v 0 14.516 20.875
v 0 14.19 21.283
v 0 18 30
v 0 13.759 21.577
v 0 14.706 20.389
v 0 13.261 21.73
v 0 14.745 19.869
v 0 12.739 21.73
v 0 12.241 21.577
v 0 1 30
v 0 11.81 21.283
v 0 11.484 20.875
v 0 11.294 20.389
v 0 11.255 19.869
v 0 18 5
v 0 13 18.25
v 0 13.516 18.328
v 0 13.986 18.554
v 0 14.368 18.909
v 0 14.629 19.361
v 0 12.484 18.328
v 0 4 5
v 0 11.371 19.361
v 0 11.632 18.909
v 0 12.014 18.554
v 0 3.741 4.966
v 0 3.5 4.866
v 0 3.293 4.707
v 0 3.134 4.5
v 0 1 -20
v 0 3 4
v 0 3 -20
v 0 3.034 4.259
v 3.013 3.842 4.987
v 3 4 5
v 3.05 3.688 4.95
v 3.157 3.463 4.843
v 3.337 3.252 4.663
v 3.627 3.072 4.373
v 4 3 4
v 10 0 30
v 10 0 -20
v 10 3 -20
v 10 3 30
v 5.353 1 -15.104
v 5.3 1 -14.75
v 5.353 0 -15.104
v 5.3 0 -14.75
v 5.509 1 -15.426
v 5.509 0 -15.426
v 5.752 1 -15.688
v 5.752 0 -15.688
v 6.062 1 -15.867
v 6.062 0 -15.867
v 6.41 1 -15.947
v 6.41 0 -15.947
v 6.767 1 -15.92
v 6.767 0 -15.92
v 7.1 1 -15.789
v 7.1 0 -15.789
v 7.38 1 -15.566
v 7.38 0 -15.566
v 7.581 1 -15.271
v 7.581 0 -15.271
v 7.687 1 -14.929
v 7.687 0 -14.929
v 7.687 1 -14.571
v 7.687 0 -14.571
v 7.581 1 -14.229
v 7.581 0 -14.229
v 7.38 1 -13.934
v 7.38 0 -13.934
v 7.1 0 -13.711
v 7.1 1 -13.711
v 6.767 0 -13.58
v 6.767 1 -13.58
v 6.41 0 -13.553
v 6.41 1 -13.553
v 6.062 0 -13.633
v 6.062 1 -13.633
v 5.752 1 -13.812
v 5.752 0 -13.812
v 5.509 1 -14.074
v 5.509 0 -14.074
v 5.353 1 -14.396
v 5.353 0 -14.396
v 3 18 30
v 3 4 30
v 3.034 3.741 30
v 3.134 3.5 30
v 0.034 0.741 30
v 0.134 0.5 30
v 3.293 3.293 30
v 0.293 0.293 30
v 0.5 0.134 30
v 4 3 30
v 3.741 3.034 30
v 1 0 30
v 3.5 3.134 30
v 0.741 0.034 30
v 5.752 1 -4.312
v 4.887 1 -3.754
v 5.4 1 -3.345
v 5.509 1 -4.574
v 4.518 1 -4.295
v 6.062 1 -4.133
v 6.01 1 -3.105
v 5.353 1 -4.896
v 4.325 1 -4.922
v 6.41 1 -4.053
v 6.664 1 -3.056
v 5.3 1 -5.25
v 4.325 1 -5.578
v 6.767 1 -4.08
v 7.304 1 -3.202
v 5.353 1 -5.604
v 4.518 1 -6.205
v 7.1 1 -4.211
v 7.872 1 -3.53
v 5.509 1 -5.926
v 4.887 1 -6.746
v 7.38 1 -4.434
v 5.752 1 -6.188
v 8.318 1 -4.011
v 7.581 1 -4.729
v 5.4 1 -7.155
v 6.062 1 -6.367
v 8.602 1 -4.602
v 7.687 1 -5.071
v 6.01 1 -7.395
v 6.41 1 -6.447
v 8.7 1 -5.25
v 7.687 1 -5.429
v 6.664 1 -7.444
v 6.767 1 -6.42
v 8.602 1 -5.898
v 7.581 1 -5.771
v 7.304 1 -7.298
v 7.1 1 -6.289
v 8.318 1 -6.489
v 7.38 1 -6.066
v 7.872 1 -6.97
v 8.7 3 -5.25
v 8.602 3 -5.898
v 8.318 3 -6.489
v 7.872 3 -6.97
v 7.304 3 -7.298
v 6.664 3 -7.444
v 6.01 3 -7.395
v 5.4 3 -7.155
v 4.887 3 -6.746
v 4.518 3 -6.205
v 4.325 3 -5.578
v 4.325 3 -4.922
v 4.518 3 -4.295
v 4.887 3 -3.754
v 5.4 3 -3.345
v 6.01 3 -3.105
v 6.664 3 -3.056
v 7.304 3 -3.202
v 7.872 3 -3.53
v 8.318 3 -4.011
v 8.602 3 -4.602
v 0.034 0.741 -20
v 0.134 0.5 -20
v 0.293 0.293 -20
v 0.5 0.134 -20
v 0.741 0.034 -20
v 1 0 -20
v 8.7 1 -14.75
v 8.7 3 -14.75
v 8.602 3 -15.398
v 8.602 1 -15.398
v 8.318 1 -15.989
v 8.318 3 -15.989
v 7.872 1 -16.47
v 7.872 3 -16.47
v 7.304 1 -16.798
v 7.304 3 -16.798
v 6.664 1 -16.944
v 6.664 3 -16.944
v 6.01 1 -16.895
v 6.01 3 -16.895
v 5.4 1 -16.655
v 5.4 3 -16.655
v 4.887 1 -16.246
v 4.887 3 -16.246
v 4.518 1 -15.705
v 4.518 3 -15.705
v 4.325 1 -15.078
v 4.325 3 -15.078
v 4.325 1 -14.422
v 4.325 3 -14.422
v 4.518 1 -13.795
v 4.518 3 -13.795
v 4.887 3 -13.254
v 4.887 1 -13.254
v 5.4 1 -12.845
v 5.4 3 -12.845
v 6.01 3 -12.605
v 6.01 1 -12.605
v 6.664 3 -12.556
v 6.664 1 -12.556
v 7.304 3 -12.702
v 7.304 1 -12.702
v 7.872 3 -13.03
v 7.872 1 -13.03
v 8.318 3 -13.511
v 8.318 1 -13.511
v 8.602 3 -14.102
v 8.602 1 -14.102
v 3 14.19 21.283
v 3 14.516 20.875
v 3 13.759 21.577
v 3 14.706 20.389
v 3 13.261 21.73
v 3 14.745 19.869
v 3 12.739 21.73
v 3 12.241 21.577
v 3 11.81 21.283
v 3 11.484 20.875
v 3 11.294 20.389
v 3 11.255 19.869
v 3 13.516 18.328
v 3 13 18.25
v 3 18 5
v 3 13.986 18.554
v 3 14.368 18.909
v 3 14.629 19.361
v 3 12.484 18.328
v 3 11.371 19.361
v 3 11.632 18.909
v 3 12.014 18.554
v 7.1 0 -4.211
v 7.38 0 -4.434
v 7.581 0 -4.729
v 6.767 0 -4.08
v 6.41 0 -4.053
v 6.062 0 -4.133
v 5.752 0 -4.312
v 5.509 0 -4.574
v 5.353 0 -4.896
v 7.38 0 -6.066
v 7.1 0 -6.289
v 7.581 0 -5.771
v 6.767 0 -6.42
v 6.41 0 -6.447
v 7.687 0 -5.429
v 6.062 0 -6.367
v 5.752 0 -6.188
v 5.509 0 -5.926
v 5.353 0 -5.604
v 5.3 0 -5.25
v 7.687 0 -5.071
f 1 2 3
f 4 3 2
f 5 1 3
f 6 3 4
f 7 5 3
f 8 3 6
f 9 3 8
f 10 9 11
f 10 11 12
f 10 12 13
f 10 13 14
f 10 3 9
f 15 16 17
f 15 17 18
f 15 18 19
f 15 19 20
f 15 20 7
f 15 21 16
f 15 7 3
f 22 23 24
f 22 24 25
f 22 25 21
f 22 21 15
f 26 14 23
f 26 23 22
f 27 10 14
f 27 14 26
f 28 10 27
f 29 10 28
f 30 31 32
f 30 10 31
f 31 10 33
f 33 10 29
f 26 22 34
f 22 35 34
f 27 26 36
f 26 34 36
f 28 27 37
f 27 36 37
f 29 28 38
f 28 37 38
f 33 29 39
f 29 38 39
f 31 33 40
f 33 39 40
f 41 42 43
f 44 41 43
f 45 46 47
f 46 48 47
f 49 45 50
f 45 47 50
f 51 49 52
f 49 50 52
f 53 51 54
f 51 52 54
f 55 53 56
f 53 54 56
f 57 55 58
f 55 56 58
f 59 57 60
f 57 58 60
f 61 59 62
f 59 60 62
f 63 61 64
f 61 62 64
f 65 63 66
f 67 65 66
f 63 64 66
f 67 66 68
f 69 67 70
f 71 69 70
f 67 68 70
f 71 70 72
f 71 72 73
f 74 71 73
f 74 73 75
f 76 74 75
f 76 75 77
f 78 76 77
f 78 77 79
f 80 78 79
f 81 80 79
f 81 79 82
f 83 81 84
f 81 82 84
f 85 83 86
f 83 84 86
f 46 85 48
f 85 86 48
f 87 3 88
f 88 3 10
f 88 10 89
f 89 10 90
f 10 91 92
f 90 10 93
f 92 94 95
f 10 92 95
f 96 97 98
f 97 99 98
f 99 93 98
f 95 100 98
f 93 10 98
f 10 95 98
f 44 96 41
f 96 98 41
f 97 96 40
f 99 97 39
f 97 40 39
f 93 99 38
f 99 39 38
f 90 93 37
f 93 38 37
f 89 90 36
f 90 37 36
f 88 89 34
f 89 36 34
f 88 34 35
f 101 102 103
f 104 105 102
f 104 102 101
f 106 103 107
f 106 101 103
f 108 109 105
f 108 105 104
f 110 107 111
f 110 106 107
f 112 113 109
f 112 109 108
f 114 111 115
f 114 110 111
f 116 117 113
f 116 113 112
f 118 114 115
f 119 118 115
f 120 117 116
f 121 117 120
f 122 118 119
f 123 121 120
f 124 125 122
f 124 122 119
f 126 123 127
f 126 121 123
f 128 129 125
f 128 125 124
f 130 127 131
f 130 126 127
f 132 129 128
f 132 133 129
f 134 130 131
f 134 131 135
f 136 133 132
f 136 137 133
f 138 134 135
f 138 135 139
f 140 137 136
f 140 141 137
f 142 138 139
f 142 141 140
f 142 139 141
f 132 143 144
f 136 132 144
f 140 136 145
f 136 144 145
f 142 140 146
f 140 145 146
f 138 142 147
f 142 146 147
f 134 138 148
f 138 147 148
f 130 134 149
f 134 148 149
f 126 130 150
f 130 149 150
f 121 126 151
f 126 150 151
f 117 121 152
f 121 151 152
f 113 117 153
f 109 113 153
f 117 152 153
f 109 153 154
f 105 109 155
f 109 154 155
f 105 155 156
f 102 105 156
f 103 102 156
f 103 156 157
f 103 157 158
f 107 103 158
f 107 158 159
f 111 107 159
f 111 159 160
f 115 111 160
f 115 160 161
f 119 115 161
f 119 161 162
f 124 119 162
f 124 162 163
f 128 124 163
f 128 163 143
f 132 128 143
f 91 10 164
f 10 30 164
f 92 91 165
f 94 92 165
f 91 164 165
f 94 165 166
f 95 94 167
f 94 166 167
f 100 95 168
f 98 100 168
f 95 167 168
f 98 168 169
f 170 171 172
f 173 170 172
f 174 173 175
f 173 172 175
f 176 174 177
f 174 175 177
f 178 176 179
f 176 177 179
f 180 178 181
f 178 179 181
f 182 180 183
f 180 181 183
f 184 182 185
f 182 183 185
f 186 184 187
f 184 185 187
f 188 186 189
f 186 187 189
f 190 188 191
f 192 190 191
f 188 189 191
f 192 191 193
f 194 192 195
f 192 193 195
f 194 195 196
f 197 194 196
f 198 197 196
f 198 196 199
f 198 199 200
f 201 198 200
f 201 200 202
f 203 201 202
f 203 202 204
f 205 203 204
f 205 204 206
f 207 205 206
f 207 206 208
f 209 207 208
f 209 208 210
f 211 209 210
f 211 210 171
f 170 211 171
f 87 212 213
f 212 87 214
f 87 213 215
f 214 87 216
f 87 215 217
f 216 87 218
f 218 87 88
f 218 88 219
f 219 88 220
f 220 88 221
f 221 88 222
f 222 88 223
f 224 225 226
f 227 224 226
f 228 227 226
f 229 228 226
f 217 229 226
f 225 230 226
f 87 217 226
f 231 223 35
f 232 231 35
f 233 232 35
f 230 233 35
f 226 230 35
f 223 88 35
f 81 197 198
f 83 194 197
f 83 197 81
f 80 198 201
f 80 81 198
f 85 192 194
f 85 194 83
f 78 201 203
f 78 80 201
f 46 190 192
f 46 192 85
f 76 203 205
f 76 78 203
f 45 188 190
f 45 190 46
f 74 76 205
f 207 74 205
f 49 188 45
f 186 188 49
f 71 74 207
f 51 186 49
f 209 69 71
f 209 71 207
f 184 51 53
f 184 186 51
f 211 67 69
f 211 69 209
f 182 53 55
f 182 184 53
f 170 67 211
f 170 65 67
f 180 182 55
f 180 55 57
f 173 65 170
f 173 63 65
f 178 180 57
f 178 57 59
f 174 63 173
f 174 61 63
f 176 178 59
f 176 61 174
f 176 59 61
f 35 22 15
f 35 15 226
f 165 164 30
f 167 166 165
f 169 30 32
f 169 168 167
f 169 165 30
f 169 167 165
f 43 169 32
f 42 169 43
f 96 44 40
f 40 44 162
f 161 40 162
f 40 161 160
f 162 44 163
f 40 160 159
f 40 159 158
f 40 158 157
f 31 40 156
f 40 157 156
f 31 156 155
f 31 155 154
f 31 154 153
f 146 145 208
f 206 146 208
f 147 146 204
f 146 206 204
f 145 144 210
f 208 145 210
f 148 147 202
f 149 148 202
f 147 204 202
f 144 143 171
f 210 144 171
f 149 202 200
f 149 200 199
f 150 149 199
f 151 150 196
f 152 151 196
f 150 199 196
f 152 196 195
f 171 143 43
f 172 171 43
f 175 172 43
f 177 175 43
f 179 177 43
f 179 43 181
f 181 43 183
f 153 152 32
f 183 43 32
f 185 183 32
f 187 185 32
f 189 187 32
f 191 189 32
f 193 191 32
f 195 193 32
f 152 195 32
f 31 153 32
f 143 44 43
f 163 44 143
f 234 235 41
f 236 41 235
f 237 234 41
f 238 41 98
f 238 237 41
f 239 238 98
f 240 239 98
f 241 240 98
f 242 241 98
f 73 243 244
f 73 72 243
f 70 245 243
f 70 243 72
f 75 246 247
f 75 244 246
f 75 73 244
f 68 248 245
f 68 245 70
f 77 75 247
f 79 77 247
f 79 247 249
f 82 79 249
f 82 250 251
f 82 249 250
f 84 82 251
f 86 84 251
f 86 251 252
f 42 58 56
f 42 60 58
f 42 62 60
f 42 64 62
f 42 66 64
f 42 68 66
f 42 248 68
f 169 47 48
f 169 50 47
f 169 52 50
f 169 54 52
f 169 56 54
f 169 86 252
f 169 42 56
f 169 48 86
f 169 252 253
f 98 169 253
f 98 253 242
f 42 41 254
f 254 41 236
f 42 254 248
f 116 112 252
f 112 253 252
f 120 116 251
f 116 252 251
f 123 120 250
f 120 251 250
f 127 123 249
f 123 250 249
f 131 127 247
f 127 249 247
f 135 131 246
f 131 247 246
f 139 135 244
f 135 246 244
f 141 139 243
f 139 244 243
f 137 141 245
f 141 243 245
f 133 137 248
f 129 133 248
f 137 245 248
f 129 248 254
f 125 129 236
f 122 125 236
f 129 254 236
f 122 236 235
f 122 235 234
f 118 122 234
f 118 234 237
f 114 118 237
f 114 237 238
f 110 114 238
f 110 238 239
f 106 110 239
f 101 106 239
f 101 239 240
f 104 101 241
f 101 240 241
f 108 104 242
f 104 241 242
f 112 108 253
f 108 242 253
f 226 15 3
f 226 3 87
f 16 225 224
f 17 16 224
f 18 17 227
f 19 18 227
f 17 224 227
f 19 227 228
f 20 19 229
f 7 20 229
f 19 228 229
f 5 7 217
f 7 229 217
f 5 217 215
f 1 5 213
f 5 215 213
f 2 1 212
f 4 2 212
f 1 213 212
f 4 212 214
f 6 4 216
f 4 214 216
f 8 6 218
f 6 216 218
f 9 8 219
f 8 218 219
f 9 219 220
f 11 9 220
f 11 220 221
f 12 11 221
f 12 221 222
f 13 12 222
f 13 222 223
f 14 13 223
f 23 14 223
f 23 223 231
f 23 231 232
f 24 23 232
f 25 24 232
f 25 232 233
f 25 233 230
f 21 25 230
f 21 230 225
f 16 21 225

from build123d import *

# Parameters (mm, degrees)
SKETCH1_W                      = 10
SKETCH1_H                      = 20
SKETCH1_R                      = 1.175
BOSS_EXTRUDE1_DEPTH            = 3
CBORE_FOR_M2_SHCS1_D           = 2.4
CBORE_FOR_M2_SHCS1_CBORE_D     = 4.4
CBORE_FOR_M2_SHCS1_CBORE_DEPTH = 2
SKETCH6_W                      = 10
SKETCH6_H                      = 3
BOSS_EXTRUDE2_DEPTH            = 30
SKETCH8_W                      = 3
SKETCH8_H                      = 25
BOSS_EXTRUDE3_DEPTH            = 15
SKETCH9_R                      = 1.75
CUT_EXTRUDE1_DEPTH             = 36.67912555
FILLET1_R                      = 1
FILLET2_R                      = 1


with BuildPart() as part:
    # Sketch1 → Boss-Extrude1 (new body)
    with BuildSketch(Plane(origin=(0, 0, 0), x_dir=(1, 0, 0), z_dir=(0, 1, 0))):
        with Locations((5, 10)):
            Rectangle(SKETCH1_W, SKETCH1_H)
        with Locations(Location((6.5, 5.25, 0), (0, 0, 270))):
            Circle(SKETCH1_R, mode=Mode.SUBTRACT)
        with Locations(Location((6.5, 14.75, 0), (0, 0, 270))):
            Circle(SKETCH1_R, mode=Mode.SUBTRACT)
    extrude(amount=BOSS_EXTRUDE1_DEPTH)

    # CBORE for M2 SHCS1 (through all)
    with Locations(Plane(origin=(0, 3, 0), x_dir=(1, 0, 0), z_dir=(0, 1, 0))):
        with Locations((6.5, 14.75), (6.5, 5.25)):
            CounterBoreHole(CBORE_FOR_M2_SHCS1_D / 2, CBORE_FOR_M2_SHCS1_CBORE_D / 2, CBORE_FOR_M2_SHCS1_CBORE_DEPTH)

    # Sketch6 → Boss-Extrude2 (add)
    with BuildSketch(Plane(origin=(0, 0, 0), x_dir=(-1, 0, 0), z_dir=(0, 0, -1))):
        with Locations((-5, 1.5)):
            Rectangle(SKETCH6_W, SKETCH6_H)
    extrude(amount=-BOSS_EXTRUDE2_DEPTH)

    # Sketch8 → Boss-Extrude3 (add)
    with BuildSketch(Plane(origin=(0, 3, 0), x_dir=(1, 0, 0), z_dir=(0, 1, 0))):
        with Locations((1.5, -17.5)):
            Rectangle(SKETCH8_W, SKETCH8_H)
    extrude(amount=BOSS_EXTRUDE3_DEPTH)

    # Sketch9 → Cut-Extrude1 (cut, through all)
    with BuildSketch(Plane(origin=(3, 0, 0), x_dir=(0, 0, -1), z_dir=(1, 0, 0))):
        with Locations((-20, 13)):
            Circle(SKETCH9_R)
    extrude(amount=-CUT_EXTRUDE1_DEPTH, mode=Mode.SUBTRACT)

    # Fillet1
    fillet1_edges = [part.edges().sort_by_distance(p)[0] for p in [
        (3, 3, 17.5),
        (1.5, 3, 5),
    ]]
    fillet(fillet1_edges, radius=FILLET1_R)

    # Fillet2
    fillet2_edges = [part.edges().sort_by_distance(p)[0] for p in [
        (0, 0, 5),
    ]]
    fillet(fillet2_edges, radius=FILLET2_R)


solid = part.part
